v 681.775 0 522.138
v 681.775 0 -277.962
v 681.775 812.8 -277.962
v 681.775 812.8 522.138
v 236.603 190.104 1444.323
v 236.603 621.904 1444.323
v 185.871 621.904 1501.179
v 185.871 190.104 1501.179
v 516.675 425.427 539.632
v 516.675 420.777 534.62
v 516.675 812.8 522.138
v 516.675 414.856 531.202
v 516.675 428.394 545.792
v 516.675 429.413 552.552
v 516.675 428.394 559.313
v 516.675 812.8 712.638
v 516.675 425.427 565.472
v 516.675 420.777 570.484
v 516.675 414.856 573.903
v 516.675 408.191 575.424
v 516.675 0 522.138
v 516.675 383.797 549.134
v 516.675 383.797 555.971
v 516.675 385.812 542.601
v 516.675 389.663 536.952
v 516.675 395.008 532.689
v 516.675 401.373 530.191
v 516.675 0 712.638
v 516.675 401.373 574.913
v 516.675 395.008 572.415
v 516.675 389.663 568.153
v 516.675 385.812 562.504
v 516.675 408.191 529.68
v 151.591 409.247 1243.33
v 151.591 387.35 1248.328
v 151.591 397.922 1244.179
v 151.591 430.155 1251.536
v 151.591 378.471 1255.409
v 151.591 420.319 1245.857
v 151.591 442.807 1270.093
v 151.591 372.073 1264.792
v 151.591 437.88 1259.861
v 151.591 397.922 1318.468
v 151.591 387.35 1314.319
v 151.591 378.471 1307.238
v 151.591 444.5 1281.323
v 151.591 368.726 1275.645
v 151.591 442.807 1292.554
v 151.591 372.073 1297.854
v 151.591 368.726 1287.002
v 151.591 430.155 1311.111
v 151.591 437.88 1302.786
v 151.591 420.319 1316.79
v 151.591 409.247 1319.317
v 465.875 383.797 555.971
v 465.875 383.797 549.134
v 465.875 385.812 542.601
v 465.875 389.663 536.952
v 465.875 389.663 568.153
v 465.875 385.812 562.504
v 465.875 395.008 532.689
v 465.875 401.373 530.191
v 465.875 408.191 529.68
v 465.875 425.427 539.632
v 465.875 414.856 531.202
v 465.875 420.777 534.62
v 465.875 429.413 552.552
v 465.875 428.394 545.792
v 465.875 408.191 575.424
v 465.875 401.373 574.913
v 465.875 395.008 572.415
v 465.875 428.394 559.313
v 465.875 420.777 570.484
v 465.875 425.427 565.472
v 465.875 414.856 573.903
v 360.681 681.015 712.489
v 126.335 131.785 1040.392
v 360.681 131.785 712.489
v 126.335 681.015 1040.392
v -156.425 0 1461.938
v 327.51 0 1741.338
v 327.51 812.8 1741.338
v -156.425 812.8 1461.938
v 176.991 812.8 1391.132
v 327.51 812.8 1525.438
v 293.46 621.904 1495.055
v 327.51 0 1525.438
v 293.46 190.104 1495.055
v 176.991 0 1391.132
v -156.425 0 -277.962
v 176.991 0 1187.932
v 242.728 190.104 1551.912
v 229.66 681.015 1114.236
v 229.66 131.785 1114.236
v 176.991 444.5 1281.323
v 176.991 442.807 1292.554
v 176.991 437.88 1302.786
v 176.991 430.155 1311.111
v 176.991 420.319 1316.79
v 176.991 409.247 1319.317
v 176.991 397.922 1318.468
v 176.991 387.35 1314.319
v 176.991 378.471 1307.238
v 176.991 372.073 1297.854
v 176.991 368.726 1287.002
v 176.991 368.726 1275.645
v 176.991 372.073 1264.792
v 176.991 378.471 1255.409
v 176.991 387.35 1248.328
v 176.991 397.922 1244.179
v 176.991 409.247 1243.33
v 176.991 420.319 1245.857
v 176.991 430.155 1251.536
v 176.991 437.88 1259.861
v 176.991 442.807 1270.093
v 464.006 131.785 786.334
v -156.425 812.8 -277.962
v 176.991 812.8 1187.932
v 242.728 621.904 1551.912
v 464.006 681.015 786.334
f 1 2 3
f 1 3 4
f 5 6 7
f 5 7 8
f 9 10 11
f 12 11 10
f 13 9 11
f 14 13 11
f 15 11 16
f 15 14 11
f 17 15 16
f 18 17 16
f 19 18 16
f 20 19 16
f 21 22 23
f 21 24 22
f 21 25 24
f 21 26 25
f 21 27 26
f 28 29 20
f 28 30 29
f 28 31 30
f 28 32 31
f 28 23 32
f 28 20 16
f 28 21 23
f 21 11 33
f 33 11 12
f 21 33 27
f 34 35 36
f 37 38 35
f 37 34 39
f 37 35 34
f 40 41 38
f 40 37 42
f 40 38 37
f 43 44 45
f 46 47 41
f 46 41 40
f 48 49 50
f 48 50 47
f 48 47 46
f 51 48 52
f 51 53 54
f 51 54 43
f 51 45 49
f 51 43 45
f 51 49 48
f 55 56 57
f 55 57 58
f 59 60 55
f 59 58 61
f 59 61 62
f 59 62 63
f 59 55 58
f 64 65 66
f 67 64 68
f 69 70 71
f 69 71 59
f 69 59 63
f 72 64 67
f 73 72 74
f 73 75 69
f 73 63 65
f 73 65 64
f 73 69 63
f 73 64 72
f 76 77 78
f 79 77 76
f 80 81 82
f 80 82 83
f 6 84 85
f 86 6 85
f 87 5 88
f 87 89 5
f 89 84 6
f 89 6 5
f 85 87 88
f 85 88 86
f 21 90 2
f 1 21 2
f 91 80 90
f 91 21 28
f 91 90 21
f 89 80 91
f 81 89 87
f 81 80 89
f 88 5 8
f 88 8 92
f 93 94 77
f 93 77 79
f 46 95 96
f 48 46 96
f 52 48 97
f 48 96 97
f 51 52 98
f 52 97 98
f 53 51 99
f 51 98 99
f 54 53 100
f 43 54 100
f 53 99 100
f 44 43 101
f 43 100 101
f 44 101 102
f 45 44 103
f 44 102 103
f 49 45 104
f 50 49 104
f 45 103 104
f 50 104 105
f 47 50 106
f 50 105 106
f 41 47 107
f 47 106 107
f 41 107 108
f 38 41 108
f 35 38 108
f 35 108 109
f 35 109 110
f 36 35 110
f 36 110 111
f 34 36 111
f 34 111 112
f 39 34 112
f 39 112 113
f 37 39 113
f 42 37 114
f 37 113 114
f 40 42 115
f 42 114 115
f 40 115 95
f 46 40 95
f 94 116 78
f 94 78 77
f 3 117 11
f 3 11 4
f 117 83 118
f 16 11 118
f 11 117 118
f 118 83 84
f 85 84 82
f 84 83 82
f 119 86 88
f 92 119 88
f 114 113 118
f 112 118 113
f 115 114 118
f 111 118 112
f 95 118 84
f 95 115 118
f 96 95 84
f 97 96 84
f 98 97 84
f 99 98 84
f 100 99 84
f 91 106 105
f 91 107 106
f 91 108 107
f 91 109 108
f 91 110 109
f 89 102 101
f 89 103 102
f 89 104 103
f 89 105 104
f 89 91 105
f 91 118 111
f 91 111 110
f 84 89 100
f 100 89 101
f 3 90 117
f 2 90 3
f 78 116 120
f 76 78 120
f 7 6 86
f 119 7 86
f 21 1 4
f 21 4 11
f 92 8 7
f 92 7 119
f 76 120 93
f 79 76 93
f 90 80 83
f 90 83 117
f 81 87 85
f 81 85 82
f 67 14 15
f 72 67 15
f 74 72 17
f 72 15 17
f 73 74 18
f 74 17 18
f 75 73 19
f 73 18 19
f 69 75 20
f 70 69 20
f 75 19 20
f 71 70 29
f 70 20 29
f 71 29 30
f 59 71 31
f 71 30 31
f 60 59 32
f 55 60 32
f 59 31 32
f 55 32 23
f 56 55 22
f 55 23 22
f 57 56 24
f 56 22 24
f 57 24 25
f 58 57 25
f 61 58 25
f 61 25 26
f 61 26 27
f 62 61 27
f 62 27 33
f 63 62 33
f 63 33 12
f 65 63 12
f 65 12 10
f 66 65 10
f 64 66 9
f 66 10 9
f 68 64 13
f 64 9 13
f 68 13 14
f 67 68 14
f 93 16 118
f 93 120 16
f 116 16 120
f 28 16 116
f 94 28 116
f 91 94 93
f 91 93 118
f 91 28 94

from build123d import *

# Parameters (mm, degrees)
F1_DEPTH = 812.8
F2_W     = 76.2
F2_H     = 431.8
F3_DEPTH = 76.2
F4_W     = 549.230704
F4_H     = 403.036444
F5_DEPTH = 127
F6_R     = 38.1
F7_DEPTH = 25.4
F8_R     = 22.936038
F9_DEPTH = 50.8


with BuildPart() as f1:
    # F0 (on Front) → F1 (new body)
    with BuildSketch(Plane.XZ):
        Polygon((327.509973, 1525.438145), (327.509973, 1741.338145), (-156.425023, 1461.938145), (-156.425023, -277.961855), (681.774977, -277.961855), (681.774977, 522.138145), (516.674977, 522.138145), (516.674977, 712.638145), (176.990611, 1187.931919), (176.990611, 1391.131919), align=None)
    extrude(amount=-F1_DEPTH)

    # F2 (on face) → F3 (cut)
    with BuildSketch(Plane(origin=(-612.619926, 0, 686.57398), x_dir=(0.74615, 0, 0.665778), z_dir=(0.665778, 0, -0.74615))):
        with Locations((1176.240321, -406.003956)):
            Rectangle(F2_W, F2_H)
    extrude(amount=-F3_DEPTH, mode=Mode.SUBTRACT)

    # F4 (on face) → F5 (cut)
    with BuildSketch(Plane(origin=(679.11339, 0, 485.350775), x_dir=(0, 1, 0), z_dir=(0.813581, 0, 0.581452))):
        with Locations((406.4, 571.46676)):
            Rectangle(F4_W, F4_H)
    extrude(amount=-F5_DEPTH, mode=Mode.SUBTRACT)

    # F6 (on face) → F7 (cut)
    with BuildSketch(Plane.YZ.offset(176.990611)):
        with Locations((406.4, 1281.323433)):
            Circle(F6_R)
    extrude(amount=-F7_DEPTH, mode=Mode.SUBTRACT)

    # F8 (on face) → F9 (cut)
    with BuildSketch(Plane.YZ.offset(516.674977)):
        with Locations((406.476498, 552.552164)):
            Circle(F8_R)
    extrude(amount=-F9_DEPTH, mode=Mode.SUBTRACT)


solid = f1.part
